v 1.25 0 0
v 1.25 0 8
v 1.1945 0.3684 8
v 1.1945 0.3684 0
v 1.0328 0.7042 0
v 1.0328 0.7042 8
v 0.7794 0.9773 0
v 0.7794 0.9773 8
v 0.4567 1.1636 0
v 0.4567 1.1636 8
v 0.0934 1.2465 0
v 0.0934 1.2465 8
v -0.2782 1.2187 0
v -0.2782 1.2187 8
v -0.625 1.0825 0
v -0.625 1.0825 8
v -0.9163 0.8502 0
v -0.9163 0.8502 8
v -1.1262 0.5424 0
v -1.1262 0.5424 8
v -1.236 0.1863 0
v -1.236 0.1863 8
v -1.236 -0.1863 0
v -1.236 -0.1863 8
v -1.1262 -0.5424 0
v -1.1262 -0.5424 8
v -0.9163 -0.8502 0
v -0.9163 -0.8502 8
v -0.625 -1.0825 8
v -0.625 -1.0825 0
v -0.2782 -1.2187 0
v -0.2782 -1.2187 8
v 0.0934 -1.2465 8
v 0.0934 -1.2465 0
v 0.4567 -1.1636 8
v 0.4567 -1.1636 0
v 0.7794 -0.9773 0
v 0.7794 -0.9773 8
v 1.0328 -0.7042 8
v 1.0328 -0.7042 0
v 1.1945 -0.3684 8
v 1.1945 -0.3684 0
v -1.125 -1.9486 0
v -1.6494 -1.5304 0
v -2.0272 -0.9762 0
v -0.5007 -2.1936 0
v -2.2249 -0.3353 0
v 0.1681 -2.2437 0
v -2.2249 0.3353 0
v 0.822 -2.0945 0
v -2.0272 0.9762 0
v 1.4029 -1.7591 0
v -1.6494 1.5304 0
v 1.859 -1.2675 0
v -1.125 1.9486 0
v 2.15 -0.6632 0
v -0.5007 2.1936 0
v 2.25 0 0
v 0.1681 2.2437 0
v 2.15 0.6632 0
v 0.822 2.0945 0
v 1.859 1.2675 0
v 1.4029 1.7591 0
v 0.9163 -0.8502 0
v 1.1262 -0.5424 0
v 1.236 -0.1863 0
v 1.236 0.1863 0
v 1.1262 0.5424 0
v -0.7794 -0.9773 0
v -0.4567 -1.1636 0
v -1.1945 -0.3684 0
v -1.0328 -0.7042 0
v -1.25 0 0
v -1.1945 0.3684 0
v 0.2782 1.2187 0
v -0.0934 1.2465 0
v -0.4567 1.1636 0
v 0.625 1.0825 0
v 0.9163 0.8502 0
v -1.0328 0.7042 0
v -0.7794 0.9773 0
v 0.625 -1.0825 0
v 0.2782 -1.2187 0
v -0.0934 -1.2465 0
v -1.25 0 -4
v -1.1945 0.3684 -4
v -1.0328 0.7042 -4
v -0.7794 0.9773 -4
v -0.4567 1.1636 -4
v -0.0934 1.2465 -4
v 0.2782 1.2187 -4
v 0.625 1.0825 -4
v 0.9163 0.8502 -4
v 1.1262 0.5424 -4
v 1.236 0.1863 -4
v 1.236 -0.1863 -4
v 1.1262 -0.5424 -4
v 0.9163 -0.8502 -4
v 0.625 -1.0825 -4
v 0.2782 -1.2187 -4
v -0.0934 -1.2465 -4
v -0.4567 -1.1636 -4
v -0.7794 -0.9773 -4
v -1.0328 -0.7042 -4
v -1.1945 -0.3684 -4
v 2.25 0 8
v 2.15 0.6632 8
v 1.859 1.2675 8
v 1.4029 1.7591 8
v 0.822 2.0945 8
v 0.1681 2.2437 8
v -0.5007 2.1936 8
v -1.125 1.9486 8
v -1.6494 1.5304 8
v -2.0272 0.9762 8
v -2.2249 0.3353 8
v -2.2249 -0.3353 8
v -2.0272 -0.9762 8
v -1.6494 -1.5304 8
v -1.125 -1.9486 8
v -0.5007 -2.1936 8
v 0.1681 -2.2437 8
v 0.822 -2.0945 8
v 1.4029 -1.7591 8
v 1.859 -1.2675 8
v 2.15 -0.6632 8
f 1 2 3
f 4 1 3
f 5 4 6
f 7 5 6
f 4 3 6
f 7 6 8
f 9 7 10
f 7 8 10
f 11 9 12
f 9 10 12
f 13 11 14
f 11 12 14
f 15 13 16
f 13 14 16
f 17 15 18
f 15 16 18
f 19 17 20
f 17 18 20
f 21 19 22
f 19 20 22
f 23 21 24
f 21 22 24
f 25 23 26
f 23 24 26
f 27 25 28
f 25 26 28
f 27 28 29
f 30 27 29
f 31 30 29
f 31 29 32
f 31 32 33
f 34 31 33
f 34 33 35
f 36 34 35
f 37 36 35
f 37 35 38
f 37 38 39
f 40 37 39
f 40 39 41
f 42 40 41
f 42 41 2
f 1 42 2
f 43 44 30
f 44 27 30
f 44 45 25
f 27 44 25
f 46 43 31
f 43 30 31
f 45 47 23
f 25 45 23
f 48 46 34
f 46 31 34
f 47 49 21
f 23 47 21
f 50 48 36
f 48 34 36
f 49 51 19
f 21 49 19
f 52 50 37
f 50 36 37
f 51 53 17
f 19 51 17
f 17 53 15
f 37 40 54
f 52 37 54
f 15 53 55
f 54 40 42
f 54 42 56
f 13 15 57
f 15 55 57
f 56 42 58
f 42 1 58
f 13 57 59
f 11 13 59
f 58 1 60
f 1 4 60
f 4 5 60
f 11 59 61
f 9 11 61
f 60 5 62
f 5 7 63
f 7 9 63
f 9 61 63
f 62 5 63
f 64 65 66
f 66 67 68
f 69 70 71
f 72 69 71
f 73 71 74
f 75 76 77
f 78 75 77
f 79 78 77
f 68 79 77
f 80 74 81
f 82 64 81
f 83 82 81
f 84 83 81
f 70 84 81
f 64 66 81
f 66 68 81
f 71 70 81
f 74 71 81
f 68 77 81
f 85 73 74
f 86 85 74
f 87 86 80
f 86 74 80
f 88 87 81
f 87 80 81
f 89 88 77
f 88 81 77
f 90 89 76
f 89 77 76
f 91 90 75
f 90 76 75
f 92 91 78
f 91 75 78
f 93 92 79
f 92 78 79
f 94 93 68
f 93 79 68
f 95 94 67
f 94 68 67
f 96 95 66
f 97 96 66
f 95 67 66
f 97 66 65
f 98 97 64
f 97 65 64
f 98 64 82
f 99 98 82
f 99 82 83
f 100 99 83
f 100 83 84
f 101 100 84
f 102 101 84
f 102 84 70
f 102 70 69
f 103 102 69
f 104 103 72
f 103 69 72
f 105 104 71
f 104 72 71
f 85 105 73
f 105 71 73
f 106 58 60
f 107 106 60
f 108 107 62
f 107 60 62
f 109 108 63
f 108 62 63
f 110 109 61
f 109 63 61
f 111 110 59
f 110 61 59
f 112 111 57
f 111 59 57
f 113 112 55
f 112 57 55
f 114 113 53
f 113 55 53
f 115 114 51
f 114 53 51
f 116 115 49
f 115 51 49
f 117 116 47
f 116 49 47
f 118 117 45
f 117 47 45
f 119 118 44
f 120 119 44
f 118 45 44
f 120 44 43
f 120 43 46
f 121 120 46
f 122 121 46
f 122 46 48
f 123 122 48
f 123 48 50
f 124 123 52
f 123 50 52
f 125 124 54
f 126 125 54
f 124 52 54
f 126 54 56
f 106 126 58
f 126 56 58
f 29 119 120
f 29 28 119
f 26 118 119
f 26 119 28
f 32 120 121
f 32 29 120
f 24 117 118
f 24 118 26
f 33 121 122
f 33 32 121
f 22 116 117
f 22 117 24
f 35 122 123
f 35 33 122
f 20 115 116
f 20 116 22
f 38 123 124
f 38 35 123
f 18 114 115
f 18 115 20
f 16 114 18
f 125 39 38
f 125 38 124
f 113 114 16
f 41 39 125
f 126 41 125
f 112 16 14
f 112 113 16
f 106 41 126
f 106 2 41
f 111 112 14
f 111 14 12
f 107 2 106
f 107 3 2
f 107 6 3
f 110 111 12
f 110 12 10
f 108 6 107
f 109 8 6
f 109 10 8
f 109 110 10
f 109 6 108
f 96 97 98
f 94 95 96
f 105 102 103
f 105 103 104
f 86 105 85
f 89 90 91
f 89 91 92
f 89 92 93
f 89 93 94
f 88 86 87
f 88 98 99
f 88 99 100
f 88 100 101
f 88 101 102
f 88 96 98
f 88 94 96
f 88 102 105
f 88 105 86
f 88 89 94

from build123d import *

# Parameters (mm, degrees)
SKETCH_1_R          = 2.25
EXTRUDE_1_DEPTH     = 8
SKETCH_2_R          = 1.25
CUT_EXTRUDE_1_DEPTH = 15
SKETCH_3_R          = 1.25
EXTRUDE_2_DEPTH     = 4


with BuildPart() as part:
    # 草图1 → 凸台-拉伸1 (new body)
    with BuildSketch(Plane.XY):
        Circle(SKETCH_1_R)
    extrude(amount=EXTRUDE_1_DEPTH)

    # 草图2 → 切除-拉伸1 (cut)
    with BuildSketch(Plane.XY.offset(8)):
        Circle(SKETCH_2_R)
    extrude(amount=-CUT_EXTRUDE_1_DEPTH, mode=Mode.SUBTRACT)


with BuildPart() as body_2:
    # 草图3 → 凸台-拉伸2 (new body)
    with BuildSketch(Plane(origin=(0, 0, 0), x_dir=(-1, 0, 0), z_dir=(0, 0, -1))):
        Circle(SKETCH_3_R)
    extrude(amount=EXTRUDE_2_DEPTH)


solid = Compound([part.part, body_2.part])
